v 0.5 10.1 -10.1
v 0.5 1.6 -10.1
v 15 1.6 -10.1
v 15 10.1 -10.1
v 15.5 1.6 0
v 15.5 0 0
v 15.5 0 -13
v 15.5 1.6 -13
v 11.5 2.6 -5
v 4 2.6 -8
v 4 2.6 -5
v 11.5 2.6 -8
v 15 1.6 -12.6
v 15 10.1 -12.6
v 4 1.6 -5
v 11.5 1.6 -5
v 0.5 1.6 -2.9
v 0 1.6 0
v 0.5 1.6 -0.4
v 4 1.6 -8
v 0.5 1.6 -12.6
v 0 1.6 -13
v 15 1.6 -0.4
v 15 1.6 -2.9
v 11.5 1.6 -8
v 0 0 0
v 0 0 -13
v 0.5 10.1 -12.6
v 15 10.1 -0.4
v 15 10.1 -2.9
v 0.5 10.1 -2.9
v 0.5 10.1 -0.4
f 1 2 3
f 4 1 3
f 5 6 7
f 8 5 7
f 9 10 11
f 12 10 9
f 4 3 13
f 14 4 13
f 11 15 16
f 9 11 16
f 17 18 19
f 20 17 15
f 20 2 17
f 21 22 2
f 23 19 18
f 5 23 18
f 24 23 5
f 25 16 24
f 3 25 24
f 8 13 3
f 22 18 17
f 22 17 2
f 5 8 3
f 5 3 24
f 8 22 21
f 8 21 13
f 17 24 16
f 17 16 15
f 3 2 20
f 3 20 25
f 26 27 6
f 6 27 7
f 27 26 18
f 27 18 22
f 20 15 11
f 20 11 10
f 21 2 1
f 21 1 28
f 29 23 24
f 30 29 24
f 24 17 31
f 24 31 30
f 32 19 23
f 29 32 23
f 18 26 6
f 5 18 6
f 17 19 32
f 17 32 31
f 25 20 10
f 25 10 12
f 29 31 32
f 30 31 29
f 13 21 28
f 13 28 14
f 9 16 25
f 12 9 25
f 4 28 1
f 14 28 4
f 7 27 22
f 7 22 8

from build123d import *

# Parameters (mm, degrees)
SKETCH1_W       = 15.5
SKETCH1_H       = 13
PCB_DEPTH       = 1.6
HEADER_HV_START = 1.6
SKETCH2_W       = 14.5
SKETCH2_H       = 2.5
HEADER_HV_DEPTH = 8.5
HEADER_LV_START = 1.6
SKETCH3_W       = 14.5
SKETCH3_H       = 2.5
HEADER_LV_DEPTH = 8.5
MOSFETS_START   = 1.6
SKETCH4_W       = 7.5
SKETCH4_H       = 3
MOSFETS_DEPTH   = 1


with BuildPart() as part:
    # Sketch1 → PCB (new body)
    with BuildSketch(Plane(origin=(0, 0, 0), x_dir=(1, 0, 0), z_dir=(0, 1, 0))):
        with Locations((7.75, 6.5)):
            Rectangle(SKETCH1_W, SKETCH1_H)
    extrude(amount=PCB_DEPTH)

    # Sketch2 → Header_HV (add)
    with BuildSketch(Plane(origin=(0, 0, 0), x_dir=(1, 0, 0), z_dir=(0, 1, 0)).offset(HEADER_HV_START)):
        with Locations((7.75, 1.65)):
            Rectangle(SKETCH2_W, SKETCH2_H)
    extrude(amount=HEADER_HV_DEPTH)

    # Sketch3 → Header_LV (add)
    with BuildSketch(Plane(origin=(0, 0, 0), x_dir=(1, 0, 0), z_dir=(0, 1, 0)).offset(HEADER_LV_START)):
        with Locations((7.75, 11.35)):
            Rectangle(SKETCH3_W, SKETCH3_H)
    extrude(amount=HEADER_LV_DEPTH)

    # Sketch4 → MOSFETs (add)
    with BuildSketch(Plane(origin=(0, 0, 0), x_dir=(1, 0, 0), z_dir=(0, 1, 0)).offset(MOSFETS_START)):
        with Locations((7.75, 6.5)):
            Rectangle(SKETCH4_W, SKETCH4_H)
    extrude(amount=MOSFETS_DEPTH)


solid = part.part
